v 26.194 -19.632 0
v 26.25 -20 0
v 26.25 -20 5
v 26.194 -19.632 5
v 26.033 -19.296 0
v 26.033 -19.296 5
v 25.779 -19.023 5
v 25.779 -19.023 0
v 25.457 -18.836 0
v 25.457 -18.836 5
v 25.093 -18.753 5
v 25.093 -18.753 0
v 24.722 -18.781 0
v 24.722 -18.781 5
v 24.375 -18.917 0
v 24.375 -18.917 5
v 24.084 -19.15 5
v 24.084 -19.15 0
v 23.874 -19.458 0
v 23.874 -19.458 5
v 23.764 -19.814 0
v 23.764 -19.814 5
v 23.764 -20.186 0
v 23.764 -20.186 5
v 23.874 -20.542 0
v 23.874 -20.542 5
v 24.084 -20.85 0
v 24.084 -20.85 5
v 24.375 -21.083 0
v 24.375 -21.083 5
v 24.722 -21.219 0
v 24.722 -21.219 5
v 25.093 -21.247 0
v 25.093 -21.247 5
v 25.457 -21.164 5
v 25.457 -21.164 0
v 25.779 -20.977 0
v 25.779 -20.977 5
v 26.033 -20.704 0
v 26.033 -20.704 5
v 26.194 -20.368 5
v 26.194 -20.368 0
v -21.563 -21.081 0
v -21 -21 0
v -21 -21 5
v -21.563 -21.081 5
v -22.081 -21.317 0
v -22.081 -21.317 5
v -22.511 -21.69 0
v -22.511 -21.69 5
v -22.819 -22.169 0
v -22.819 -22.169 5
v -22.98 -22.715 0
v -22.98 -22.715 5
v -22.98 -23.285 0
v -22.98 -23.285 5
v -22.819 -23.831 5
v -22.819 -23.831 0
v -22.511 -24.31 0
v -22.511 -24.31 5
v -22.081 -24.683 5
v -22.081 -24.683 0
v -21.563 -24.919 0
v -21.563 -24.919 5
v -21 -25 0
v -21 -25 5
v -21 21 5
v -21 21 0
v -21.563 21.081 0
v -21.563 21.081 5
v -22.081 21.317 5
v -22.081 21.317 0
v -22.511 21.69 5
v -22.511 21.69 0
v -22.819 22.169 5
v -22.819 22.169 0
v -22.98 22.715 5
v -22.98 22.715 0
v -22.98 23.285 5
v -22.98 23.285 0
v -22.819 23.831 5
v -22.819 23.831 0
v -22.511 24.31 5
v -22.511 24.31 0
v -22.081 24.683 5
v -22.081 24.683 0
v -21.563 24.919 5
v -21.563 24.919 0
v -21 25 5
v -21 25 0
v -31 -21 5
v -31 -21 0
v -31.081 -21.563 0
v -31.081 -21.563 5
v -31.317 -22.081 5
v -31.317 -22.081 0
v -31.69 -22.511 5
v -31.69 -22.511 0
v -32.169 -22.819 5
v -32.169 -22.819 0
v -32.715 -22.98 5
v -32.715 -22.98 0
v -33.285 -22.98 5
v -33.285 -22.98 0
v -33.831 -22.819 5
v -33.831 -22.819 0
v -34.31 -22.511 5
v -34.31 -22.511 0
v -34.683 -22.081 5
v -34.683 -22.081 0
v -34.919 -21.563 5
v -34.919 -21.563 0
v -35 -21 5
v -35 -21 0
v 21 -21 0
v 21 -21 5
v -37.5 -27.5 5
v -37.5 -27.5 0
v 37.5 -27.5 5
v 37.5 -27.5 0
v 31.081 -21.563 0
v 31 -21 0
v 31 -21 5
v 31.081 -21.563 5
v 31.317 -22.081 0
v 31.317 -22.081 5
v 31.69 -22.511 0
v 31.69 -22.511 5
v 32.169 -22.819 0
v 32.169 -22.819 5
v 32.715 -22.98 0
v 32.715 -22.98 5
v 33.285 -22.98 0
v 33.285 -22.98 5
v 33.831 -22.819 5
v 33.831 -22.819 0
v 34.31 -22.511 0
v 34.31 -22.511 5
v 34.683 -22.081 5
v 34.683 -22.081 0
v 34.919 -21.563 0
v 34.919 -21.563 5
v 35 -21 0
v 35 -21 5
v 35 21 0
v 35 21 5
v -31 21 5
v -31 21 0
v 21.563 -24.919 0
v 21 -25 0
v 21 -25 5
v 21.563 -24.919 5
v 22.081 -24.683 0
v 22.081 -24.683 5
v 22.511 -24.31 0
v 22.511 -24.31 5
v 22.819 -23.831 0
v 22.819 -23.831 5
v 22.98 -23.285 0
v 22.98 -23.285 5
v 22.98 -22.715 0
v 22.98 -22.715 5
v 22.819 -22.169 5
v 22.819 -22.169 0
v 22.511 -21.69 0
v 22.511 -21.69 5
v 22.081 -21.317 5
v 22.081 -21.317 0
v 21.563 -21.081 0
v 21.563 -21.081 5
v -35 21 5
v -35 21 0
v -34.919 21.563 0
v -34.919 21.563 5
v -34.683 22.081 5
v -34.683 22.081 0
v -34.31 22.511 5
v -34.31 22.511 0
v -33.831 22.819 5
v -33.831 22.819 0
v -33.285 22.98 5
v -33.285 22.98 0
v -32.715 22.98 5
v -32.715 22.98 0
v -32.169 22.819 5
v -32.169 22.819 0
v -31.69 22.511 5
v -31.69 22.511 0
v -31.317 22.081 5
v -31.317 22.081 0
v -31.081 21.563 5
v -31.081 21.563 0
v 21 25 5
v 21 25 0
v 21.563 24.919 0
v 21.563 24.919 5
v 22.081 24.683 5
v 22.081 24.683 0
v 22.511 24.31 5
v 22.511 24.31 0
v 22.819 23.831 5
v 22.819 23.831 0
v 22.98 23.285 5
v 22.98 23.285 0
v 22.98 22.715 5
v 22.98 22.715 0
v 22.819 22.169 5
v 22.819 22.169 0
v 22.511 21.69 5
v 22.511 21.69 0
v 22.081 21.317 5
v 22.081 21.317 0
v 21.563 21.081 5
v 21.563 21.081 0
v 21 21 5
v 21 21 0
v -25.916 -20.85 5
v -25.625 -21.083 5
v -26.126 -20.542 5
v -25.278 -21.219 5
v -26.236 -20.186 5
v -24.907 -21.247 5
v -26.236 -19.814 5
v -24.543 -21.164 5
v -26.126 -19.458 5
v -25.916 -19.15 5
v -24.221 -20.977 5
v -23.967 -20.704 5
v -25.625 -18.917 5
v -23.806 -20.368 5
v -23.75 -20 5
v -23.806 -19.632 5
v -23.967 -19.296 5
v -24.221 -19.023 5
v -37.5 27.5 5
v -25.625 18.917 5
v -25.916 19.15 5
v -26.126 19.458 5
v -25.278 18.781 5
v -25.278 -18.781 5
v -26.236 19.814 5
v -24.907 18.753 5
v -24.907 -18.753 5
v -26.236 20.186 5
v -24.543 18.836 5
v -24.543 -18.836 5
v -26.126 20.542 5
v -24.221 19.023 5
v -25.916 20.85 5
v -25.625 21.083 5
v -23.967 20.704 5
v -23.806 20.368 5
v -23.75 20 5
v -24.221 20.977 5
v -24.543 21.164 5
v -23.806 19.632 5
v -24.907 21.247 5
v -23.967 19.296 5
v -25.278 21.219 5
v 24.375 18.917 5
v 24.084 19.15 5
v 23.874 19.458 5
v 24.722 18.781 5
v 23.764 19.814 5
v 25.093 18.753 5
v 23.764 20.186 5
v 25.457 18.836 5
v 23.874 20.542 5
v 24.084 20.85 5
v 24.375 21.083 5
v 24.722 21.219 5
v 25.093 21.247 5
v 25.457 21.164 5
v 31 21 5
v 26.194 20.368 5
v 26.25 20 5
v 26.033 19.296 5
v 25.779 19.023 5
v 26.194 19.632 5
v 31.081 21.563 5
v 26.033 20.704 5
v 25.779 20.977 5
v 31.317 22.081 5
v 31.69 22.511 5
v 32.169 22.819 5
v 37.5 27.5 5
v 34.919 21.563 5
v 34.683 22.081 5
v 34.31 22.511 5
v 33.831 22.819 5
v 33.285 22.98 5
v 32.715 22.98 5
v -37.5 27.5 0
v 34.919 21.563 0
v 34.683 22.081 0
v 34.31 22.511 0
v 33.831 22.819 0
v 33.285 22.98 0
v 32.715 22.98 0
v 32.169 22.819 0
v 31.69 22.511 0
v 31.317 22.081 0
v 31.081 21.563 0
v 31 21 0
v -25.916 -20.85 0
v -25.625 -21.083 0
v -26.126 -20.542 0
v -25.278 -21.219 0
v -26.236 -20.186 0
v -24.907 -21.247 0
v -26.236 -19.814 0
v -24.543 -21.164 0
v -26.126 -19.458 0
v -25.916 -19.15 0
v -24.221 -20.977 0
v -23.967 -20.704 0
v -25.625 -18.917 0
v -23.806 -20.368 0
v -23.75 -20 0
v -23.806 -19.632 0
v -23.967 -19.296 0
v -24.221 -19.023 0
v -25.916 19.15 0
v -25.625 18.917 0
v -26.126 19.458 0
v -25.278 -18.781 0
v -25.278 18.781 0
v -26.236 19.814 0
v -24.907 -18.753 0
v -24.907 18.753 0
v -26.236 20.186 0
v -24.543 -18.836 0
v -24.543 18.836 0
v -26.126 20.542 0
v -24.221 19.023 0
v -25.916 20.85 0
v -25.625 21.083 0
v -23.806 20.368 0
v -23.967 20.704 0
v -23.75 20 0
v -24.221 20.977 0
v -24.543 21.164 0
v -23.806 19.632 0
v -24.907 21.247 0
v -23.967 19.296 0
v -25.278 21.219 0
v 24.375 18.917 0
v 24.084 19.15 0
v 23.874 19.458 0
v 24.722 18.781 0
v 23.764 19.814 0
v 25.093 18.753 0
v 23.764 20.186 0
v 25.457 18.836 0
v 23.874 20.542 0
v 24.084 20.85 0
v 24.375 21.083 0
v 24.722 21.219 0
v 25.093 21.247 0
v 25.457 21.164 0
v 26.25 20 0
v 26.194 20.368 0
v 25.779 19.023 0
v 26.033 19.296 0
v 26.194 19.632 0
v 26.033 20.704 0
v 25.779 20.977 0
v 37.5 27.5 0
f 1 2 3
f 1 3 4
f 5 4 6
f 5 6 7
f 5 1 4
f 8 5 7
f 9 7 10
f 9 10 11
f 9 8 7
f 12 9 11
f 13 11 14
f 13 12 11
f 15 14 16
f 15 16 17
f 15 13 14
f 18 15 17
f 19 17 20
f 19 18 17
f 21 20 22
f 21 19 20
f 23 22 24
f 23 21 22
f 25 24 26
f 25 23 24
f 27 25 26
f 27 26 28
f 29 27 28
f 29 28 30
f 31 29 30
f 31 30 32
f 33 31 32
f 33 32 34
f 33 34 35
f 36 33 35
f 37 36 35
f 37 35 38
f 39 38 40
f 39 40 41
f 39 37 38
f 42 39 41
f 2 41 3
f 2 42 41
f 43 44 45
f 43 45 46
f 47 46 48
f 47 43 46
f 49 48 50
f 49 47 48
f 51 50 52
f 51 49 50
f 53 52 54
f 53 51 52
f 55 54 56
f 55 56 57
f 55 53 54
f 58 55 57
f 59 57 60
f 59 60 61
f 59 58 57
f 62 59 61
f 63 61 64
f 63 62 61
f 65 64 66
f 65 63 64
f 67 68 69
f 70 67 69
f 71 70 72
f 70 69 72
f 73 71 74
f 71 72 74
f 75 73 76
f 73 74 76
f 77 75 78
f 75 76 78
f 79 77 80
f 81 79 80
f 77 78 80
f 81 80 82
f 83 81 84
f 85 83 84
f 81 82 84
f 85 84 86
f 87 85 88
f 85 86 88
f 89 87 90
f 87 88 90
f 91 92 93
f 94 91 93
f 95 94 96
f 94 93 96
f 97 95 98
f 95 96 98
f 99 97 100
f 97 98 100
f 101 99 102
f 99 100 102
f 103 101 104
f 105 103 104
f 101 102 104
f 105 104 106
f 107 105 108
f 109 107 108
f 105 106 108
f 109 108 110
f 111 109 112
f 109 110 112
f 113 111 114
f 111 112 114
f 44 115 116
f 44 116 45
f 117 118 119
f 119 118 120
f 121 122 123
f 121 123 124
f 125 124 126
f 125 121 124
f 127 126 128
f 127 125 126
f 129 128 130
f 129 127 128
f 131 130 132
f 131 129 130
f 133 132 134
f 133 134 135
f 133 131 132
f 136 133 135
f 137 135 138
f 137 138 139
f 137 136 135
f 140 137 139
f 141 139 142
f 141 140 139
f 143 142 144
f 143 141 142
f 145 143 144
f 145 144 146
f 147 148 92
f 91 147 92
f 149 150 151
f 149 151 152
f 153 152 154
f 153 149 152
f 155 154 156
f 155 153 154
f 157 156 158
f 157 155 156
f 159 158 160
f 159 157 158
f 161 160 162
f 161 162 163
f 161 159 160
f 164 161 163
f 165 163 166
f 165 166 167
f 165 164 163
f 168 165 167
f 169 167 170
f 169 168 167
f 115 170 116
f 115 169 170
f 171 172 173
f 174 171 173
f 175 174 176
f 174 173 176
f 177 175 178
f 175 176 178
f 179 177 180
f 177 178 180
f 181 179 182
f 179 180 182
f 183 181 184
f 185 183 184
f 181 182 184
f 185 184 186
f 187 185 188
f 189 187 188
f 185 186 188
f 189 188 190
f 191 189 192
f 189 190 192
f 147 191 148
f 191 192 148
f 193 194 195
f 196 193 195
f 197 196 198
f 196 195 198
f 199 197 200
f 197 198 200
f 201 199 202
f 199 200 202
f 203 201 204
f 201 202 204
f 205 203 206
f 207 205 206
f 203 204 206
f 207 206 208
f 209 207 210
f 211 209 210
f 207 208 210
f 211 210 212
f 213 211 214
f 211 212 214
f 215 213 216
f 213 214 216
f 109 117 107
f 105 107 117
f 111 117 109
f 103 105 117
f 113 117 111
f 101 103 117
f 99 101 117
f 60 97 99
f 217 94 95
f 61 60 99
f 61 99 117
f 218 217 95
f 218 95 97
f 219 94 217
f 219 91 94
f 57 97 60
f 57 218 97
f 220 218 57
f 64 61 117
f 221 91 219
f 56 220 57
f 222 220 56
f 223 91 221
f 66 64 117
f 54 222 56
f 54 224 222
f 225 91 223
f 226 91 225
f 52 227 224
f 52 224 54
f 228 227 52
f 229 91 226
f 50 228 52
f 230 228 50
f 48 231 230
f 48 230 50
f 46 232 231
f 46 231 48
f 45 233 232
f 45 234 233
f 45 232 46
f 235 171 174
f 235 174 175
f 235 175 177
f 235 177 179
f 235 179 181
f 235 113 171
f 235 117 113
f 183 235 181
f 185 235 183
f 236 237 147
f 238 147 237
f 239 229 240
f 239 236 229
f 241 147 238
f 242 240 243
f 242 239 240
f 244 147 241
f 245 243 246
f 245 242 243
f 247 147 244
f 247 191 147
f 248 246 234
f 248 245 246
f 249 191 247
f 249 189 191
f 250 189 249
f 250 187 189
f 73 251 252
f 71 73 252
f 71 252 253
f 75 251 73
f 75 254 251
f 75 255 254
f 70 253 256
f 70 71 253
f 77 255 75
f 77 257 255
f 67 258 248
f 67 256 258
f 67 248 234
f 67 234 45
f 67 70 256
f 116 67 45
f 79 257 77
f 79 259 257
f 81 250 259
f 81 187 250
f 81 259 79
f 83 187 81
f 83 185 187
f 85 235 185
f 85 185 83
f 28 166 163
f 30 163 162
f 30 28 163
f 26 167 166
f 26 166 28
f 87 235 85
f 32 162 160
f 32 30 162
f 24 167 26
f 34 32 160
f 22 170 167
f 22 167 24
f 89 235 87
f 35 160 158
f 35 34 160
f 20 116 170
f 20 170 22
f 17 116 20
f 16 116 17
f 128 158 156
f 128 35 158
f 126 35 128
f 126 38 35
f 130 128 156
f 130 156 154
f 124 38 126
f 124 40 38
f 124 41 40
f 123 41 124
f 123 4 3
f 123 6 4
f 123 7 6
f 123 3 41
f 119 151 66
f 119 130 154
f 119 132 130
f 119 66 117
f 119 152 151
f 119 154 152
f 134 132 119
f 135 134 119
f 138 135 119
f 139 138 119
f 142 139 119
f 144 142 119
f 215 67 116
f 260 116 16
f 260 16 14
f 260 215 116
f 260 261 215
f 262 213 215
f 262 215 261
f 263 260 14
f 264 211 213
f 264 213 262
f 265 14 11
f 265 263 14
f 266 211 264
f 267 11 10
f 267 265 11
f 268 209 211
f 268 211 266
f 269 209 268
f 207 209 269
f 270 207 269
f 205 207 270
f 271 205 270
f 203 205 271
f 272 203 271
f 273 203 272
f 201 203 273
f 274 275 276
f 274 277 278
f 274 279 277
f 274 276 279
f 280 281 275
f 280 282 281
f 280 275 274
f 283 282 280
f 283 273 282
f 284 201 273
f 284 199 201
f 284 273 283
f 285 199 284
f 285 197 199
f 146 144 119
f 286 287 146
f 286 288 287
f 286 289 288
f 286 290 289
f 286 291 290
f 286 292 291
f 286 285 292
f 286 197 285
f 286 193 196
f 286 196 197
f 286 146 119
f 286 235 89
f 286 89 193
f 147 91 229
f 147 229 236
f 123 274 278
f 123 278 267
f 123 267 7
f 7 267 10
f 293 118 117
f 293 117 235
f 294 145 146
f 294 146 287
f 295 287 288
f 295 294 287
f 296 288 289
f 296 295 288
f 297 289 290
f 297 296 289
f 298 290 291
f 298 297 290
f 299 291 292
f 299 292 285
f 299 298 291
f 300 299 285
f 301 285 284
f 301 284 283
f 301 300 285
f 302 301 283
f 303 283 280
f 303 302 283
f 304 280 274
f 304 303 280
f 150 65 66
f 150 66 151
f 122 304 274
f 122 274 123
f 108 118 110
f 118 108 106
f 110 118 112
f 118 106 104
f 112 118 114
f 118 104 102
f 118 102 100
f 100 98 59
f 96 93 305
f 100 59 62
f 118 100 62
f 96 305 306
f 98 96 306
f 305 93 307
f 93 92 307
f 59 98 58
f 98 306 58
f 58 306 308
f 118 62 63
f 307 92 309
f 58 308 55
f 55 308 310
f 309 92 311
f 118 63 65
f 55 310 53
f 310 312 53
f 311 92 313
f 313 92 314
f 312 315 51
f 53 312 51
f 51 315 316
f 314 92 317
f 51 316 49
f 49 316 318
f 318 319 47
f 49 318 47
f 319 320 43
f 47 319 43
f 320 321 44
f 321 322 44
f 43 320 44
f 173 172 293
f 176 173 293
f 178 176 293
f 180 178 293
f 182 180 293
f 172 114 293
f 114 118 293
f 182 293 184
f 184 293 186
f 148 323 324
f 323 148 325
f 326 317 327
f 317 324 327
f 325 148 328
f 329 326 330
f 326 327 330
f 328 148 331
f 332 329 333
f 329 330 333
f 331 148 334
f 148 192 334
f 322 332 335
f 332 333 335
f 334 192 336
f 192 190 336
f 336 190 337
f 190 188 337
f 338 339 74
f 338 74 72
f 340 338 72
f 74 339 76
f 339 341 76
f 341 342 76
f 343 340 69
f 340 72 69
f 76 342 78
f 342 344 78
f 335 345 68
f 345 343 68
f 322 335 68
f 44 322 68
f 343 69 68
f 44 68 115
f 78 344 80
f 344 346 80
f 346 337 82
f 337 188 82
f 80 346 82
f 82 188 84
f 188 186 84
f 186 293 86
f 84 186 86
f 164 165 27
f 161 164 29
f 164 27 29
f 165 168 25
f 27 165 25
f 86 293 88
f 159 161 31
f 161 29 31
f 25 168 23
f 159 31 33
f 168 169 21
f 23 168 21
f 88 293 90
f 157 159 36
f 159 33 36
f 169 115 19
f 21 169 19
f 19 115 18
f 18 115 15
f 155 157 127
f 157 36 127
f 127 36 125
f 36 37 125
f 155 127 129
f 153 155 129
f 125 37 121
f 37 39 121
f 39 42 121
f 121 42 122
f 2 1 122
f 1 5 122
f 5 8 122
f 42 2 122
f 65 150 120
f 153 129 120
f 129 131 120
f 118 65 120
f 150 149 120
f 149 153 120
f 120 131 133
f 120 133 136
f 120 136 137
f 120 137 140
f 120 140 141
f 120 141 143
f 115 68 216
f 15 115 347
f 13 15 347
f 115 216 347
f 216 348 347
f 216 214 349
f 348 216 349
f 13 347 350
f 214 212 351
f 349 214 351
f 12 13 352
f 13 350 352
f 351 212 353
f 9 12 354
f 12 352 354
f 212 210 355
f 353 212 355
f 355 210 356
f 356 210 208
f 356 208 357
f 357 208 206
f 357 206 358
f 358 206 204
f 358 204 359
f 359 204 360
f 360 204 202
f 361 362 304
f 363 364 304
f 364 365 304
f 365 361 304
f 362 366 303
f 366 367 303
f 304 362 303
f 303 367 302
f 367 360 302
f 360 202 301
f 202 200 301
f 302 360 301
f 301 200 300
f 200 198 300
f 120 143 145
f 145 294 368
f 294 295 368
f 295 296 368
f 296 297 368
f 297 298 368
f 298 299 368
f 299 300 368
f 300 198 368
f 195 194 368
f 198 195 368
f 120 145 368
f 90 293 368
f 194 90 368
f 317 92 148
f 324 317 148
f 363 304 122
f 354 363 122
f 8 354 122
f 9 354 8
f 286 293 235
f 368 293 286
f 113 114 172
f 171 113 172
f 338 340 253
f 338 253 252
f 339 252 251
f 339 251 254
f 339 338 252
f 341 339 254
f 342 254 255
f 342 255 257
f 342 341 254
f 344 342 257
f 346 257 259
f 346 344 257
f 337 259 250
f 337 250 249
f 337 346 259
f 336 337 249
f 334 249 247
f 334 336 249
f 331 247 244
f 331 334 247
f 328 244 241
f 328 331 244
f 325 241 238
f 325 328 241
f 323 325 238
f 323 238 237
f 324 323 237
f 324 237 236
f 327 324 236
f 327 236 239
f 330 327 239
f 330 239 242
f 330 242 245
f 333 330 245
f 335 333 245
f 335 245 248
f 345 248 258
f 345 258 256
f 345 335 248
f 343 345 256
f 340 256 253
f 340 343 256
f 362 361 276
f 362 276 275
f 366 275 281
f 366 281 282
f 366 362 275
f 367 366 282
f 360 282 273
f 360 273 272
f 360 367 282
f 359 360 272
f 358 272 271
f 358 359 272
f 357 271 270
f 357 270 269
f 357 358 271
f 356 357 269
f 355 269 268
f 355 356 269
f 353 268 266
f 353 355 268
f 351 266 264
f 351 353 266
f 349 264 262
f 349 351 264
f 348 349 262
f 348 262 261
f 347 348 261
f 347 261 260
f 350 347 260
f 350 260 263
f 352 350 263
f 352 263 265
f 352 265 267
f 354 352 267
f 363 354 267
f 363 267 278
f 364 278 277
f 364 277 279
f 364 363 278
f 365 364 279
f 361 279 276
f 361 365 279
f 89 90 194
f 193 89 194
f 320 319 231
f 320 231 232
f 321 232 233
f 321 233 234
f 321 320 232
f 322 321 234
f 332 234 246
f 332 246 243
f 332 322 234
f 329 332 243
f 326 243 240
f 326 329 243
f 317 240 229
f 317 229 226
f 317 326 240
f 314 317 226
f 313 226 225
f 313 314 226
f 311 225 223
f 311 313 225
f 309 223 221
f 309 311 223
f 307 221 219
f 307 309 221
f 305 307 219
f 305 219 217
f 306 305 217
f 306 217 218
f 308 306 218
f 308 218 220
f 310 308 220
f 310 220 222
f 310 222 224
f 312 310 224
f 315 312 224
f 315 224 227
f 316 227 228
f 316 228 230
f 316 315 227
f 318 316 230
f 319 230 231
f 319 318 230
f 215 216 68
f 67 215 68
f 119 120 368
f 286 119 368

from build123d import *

# Parameters (mm, degrees)
SKETCH1_W           = 75
SKETCH1_H           = 55
SKETCH1_R           = 1.25
BOSS_EXTRUDE1_DEPTH = 5


with BuildPart() as part:
    # Sketch1 → Boss-Extrude1 (new body)
    with BuildSketch(Plane.XY):
        Rectangle(SKETCH1_W, SKETCH1_H)
        with Locations((-25, 20)):
            Circle(SKETCH1_R, mode=Mode.SUBTRACT)
        with Locations((25, 20)):
            Circle(SKETCH1_R, mode=Mode.SUBTRACT)
        with Locations((25, -20)):
            Circle(SKETCH1_R, mode=Mode.SUBTRACT)
        with Locations((-25, -20)):
            Circle(SKETCH1_R, mode=Mode.SUBTRACT)
        with BuildLine():
            Line((-21, 25), (21, 25))
            ThreePointArc((21, 25), (23, 23), (21, 21))
            Line((21, 21), (-21, 21))
            ThreePointArc((-21, 21), (-23, 23), (-21, 25))
        make_face(mode=Mode.SUBTRACT)
        with BuildLine():
            Line((-21, -25), (21, -25))
            ThreePointArc((21, -25), (23, -23), (21, -21))
            Line((21, -21), (-21, -21))
            ThreePointArc((-21, -21), (-23, -23), (-21, -25))
        make_face(mode=Mode.SUBTRACT)
        with BuildLine():
            Line((-31, 21), (-31, -21))
            ThreePointArc((-31, -21), (-33, -23), (-35, -21))
            Line((-35, -21), (-35, 21))
            ThreePointArc((-35, 21), (-33, 23), (-31, 21))
        make_face(mode=Mode.SUBTRACT)
        with BuildLine():
            Line((31, 21), (31, -21))
            ThreePointArc((31, -21), (33, -23), (35, -21))
            Line((35, -21), (35, 21))
            ThreePointArc((35, 21), (33, 23), (31, 21))
        make_face(mode=Mode.SUBTRACT)
    extrude(amount=BOSS_EXTRUDE1_DEPTH)


solid = part.part
